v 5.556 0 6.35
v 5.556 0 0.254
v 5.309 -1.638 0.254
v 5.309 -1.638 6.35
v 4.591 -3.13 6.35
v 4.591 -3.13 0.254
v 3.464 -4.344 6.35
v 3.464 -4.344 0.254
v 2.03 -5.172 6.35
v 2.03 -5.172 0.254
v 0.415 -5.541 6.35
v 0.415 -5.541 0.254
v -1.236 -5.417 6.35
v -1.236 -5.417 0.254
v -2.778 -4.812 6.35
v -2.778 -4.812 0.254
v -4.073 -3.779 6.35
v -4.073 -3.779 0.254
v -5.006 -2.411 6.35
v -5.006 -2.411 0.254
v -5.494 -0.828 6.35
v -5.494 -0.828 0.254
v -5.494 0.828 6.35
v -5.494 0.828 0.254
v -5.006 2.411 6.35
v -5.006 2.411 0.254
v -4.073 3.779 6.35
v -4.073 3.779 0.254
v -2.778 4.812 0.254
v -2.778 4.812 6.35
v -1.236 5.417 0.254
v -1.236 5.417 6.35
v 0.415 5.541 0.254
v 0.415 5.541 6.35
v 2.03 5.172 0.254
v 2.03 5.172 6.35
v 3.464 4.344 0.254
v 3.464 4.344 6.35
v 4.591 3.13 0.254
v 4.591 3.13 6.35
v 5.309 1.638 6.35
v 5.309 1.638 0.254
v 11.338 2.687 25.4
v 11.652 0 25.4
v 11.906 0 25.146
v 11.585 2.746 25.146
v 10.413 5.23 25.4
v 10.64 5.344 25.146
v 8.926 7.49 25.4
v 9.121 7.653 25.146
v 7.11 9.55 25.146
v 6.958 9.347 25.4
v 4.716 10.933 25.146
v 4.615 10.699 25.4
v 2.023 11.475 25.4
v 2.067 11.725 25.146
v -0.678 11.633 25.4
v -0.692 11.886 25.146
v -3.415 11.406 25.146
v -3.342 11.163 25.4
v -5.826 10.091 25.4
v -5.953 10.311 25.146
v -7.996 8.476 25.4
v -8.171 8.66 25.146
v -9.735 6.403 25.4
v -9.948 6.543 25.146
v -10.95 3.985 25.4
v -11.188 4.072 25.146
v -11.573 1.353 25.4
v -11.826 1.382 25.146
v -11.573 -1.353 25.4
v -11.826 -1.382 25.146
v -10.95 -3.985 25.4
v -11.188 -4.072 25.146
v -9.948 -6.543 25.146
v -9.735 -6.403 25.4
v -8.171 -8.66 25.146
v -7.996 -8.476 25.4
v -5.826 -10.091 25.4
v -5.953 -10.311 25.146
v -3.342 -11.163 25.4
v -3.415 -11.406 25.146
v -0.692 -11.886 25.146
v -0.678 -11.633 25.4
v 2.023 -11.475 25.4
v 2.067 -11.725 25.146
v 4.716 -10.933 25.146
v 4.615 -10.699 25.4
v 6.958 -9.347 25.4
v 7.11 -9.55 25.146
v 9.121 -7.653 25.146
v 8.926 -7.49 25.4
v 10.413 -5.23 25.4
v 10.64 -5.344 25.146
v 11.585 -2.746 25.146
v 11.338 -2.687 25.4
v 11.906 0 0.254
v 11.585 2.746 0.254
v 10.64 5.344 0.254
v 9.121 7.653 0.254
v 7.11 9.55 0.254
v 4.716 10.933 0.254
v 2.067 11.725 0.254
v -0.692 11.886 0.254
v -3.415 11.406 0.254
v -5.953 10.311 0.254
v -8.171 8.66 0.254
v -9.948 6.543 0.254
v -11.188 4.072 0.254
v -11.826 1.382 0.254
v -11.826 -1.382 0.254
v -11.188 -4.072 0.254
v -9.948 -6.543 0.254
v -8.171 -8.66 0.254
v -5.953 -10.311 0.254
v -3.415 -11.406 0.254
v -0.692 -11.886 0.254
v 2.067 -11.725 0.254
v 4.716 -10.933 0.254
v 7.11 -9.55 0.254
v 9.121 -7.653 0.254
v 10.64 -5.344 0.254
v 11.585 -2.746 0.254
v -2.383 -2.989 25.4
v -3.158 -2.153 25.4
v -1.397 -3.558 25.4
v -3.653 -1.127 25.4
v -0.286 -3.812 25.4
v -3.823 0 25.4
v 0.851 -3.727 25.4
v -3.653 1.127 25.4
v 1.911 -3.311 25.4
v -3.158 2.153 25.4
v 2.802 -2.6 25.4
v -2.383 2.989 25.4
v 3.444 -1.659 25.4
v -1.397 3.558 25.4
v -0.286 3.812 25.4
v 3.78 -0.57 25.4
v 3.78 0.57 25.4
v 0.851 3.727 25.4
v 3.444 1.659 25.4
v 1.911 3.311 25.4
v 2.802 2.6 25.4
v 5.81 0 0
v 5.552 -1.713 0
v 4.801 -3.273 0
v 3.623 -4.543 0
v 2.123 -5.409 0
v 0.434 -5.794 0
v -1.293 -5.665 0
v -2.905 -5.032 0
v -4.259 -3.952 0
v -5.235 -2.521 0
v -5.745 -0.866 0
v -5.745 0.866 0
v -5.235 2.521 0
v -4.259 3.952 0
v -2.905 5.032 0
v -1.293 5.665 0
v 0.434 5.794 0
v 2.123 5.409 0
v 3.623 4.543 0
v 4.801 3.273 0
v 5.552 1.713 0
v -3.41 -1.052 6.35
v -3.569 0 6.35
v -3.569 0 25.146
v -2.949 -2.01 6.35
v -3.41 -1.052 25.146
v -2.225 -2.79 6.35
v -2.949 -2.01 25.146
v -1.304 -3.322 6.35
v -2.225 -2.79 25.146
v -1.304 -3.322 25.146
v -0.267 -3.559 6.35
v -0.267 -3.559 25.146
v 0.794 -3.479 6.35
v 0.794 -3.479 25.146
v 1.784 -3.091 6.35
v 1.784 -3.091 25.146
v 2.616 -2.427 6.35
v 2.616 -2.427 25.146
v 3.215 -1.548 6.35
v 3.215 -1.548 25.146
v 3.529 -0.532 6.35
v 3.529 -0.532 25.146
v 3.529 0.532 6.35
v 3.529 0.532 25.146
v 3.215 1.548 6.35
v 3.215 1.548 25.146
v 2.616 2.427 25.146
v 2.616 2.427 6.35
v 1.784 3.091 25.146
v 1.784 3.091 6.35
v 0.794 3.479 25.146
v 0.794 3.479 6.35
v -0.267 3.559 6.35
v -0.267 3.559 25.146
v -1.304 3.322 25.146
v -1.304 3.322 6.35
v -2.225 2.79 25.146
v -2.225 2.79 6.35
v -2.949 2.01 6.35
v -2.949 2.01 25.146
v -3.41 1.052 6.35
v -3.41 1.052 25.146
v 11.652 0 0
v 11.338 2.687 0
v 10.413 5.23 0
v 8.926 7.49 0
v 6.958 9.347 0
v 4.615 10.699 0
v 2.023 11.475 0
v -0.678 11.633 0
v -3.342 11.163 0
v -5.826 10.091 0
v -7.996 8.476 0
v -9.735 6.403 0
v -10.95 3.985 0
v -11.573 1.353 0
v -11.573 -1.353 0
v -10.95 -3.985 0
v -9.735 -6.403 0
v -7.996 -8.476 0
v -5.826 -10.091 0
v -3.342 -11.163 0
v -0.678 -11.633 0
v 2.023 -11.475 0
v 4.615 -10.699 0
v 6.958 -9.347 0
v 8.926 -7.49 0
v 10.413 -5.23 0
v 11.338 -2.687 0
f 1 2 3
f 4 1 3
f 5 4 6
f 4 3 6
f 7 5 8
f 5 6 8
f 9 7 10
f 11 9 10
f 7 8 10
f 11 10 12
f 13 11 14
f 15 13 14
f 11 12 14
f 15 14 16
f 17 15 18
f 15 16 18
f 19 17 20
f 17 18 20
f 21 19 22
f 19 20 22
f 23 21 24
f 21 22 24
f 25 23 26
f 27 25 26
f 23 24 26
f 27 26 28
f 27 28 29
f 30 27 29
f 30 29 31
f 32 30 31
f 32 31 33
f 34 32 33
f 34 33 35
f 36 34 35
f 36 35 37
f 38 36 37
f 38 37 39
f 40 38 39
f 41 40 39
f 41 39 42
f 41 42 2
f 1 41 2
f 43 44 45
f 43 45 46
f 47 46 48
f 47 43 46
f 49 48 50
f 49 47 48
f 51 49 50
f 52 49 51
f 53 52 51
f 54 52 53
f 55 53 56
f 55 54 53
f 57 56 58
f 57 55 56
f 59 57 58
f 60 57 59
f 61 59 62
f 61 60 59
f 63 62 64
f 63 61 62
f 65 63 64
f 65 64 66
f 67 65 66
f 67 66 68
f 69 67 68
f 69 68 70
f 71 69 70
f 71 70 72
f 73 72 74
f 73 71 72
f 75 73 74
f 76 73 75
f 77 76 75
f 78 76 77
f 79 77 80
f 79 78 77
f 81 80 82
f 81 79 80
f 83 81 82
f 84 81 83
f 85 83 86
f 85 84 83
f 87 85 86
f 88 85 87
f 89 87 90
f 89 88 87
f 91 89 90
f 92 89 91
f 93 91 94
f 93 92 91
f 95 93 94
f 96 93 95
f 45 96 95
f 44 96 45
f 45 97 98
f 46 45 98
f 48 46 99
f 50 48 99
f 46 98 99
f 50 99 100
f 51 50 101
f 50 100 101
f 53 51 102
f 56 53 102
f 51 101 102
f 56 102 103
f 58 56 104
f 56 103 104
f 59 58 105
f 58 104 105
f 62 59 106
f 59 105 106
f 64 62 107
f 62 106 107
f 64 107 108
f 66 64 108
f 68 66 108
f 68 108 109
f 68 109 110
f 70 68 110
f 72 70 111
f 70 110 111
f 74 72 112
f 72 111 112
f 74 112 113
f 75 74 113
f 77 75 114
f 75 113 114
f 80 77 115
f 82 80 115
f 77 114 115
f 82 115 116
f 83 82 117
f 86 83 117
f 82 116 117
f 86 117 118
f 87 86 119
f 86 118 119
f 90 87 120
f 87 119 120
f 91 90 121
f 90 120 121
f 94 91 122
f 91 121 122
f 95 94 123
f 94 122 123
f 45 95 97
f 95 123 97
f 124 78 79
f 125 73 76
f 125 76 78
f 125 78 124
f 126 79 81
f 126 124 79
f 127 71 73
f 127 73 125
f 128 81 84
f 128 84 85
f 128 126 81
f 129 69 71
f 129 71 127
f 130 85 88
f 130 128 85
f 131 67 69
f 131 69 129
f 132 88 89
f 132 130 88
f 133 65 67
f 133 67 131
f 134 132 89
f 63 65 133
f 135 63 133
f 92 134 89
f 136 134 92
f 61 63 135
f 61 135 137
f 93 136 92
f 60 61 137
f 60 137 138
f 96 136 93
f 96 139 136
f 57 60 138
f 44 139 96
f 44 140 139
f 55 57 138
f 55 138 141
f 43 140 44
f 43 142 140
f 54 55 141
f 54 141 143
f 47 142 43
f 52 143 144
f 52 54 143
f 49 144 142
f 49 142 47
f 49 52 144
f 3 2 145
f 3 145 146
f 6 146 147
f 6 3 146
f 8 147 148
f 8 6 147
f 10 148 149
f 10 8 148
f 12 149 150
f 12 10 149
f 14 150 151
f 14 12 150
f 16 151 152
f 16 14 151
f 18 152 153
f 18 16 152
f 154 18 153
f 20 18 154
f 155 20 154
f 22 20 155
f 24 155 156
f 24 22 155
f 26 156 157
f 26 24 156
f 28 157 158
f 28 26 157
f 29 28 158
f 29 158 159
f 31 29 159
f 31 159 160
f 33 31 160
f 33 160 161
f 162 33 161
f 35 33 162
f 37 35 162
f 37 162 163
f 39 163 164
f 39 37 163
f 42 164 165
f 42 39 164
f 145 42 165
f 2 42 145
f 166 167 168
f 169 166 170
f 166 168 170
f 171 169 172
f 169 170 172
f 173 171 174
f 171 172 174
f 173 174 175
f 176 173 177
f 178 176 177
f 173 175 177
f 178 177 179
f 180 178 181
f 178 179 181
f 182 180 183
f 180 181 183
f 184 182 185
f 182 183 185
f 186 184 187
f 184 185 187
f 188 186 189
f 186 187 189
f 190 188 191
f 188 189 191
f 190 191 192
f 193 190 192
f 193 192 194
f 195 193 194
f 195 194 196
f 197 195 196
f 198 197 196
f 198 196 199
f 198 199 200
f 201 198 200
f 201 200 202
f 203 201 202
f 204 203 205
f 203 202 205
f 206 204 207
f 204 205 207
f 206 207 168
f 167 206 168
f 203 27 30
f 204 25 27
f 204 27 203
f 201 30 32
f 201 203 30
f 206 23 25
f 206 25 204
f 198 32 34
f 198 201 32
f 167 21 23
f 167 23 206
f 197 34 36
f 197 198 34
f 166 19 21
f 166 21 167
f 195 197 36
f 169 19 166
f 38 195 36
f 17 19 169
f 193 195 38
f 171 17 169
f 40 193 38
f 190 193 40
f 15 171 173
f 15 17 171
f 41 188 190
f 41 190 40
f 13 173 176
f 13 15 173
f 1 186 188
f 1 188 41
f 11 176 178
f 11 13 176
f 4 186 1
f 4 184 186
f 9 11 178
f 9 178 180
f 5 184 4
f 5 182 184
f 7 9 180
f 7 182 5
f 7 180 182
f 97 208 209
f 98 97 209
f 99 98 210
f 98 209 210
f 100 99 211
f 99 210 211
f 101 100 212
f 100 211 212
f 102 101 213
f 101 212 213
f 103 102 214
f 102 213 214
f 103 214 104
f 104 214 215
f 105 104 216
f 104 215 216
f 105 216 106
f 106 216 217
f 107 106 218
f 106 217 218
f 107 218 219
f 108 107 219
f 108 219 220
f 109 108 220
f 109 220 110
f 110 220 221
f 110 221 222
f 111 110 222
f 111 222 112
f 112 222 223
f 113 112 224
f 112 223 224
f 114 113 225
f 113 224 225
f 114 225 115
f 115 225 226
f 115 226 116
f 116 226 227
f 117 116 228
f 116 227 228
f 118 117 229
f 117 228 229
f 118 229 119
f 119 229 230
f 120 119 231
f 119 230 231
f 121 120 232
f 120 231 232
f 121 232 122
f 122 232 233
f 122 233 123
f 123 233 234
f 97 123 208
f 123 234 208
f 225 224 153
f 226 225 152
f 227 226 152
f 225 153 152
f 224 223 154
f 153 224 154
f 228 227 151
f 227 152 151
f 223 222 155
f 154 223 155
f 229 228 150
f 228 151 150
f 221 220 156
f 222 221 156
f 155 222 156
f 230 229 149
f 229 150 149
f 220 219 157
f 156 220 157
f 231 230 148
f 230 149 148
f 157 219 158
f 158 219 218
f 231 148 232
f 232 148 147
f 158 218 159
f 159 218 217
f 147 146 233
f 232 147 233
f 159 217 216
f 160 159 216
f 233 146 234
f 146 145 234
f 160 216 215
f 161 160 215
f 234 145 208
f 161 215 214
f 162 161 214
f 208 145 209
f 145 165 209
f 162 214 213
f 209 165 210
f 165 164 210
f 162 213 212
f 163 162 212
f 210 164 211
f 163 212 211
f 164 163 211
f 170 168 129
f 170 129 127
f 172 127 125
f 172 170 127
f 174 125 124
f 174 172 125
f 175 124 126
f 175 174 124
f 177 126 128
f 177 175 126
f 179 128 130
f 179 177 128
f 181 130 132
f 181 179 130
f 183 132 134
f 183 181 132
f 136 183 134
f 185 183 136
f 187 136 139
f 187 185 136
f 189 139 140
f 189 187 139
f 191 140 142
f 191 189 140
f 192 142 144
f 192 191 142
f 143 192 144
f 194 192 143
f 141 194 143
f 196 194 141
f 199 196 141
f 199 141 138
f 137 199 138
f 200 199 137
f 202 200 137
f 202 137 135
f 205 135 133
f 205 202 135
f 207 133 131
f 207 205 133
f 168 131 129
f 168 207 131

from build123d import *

# Parameters (mm, degrees)
F0_R           = 11.90625
F1_DEPTH       = 25.4
F2_D           = 7.1374
F2_CBORE_D     = 11.1125
F2_CBORE_DEPTH = 6.35
F3_SIZE        = 0.254


with BuildPart() as f1:
    # F0 (on Top) → F1 (new body)
    with BuildSketch(Plane.XY):
        Circle(F0_R)
    extrude(amount=F1_DEPTH)

    # F2 (through all)
    with Locations(Plane(origin=(0, 0, 0), x_dir=(1, 0, 0), z_dir=(0, 0, -1))):
        with Locations((0, 0)):
            CounterBoreHole(F2_D / 2, F2_CBORE_D / 2, F2_CBORE_DEPTH)

    # F3
    f3_edges = [f1.edges().sort_by_distance(p)[0] for p in [
        (-11.90625, 0, 25.4),
        (-11.90625, 0, 0),
        (-5.55625, 0, 0),
        (-3.5687, 0, 25.4),
    ]]
    chamfer(f3_edges, length=F3_SIZE)


solid = f1.part
